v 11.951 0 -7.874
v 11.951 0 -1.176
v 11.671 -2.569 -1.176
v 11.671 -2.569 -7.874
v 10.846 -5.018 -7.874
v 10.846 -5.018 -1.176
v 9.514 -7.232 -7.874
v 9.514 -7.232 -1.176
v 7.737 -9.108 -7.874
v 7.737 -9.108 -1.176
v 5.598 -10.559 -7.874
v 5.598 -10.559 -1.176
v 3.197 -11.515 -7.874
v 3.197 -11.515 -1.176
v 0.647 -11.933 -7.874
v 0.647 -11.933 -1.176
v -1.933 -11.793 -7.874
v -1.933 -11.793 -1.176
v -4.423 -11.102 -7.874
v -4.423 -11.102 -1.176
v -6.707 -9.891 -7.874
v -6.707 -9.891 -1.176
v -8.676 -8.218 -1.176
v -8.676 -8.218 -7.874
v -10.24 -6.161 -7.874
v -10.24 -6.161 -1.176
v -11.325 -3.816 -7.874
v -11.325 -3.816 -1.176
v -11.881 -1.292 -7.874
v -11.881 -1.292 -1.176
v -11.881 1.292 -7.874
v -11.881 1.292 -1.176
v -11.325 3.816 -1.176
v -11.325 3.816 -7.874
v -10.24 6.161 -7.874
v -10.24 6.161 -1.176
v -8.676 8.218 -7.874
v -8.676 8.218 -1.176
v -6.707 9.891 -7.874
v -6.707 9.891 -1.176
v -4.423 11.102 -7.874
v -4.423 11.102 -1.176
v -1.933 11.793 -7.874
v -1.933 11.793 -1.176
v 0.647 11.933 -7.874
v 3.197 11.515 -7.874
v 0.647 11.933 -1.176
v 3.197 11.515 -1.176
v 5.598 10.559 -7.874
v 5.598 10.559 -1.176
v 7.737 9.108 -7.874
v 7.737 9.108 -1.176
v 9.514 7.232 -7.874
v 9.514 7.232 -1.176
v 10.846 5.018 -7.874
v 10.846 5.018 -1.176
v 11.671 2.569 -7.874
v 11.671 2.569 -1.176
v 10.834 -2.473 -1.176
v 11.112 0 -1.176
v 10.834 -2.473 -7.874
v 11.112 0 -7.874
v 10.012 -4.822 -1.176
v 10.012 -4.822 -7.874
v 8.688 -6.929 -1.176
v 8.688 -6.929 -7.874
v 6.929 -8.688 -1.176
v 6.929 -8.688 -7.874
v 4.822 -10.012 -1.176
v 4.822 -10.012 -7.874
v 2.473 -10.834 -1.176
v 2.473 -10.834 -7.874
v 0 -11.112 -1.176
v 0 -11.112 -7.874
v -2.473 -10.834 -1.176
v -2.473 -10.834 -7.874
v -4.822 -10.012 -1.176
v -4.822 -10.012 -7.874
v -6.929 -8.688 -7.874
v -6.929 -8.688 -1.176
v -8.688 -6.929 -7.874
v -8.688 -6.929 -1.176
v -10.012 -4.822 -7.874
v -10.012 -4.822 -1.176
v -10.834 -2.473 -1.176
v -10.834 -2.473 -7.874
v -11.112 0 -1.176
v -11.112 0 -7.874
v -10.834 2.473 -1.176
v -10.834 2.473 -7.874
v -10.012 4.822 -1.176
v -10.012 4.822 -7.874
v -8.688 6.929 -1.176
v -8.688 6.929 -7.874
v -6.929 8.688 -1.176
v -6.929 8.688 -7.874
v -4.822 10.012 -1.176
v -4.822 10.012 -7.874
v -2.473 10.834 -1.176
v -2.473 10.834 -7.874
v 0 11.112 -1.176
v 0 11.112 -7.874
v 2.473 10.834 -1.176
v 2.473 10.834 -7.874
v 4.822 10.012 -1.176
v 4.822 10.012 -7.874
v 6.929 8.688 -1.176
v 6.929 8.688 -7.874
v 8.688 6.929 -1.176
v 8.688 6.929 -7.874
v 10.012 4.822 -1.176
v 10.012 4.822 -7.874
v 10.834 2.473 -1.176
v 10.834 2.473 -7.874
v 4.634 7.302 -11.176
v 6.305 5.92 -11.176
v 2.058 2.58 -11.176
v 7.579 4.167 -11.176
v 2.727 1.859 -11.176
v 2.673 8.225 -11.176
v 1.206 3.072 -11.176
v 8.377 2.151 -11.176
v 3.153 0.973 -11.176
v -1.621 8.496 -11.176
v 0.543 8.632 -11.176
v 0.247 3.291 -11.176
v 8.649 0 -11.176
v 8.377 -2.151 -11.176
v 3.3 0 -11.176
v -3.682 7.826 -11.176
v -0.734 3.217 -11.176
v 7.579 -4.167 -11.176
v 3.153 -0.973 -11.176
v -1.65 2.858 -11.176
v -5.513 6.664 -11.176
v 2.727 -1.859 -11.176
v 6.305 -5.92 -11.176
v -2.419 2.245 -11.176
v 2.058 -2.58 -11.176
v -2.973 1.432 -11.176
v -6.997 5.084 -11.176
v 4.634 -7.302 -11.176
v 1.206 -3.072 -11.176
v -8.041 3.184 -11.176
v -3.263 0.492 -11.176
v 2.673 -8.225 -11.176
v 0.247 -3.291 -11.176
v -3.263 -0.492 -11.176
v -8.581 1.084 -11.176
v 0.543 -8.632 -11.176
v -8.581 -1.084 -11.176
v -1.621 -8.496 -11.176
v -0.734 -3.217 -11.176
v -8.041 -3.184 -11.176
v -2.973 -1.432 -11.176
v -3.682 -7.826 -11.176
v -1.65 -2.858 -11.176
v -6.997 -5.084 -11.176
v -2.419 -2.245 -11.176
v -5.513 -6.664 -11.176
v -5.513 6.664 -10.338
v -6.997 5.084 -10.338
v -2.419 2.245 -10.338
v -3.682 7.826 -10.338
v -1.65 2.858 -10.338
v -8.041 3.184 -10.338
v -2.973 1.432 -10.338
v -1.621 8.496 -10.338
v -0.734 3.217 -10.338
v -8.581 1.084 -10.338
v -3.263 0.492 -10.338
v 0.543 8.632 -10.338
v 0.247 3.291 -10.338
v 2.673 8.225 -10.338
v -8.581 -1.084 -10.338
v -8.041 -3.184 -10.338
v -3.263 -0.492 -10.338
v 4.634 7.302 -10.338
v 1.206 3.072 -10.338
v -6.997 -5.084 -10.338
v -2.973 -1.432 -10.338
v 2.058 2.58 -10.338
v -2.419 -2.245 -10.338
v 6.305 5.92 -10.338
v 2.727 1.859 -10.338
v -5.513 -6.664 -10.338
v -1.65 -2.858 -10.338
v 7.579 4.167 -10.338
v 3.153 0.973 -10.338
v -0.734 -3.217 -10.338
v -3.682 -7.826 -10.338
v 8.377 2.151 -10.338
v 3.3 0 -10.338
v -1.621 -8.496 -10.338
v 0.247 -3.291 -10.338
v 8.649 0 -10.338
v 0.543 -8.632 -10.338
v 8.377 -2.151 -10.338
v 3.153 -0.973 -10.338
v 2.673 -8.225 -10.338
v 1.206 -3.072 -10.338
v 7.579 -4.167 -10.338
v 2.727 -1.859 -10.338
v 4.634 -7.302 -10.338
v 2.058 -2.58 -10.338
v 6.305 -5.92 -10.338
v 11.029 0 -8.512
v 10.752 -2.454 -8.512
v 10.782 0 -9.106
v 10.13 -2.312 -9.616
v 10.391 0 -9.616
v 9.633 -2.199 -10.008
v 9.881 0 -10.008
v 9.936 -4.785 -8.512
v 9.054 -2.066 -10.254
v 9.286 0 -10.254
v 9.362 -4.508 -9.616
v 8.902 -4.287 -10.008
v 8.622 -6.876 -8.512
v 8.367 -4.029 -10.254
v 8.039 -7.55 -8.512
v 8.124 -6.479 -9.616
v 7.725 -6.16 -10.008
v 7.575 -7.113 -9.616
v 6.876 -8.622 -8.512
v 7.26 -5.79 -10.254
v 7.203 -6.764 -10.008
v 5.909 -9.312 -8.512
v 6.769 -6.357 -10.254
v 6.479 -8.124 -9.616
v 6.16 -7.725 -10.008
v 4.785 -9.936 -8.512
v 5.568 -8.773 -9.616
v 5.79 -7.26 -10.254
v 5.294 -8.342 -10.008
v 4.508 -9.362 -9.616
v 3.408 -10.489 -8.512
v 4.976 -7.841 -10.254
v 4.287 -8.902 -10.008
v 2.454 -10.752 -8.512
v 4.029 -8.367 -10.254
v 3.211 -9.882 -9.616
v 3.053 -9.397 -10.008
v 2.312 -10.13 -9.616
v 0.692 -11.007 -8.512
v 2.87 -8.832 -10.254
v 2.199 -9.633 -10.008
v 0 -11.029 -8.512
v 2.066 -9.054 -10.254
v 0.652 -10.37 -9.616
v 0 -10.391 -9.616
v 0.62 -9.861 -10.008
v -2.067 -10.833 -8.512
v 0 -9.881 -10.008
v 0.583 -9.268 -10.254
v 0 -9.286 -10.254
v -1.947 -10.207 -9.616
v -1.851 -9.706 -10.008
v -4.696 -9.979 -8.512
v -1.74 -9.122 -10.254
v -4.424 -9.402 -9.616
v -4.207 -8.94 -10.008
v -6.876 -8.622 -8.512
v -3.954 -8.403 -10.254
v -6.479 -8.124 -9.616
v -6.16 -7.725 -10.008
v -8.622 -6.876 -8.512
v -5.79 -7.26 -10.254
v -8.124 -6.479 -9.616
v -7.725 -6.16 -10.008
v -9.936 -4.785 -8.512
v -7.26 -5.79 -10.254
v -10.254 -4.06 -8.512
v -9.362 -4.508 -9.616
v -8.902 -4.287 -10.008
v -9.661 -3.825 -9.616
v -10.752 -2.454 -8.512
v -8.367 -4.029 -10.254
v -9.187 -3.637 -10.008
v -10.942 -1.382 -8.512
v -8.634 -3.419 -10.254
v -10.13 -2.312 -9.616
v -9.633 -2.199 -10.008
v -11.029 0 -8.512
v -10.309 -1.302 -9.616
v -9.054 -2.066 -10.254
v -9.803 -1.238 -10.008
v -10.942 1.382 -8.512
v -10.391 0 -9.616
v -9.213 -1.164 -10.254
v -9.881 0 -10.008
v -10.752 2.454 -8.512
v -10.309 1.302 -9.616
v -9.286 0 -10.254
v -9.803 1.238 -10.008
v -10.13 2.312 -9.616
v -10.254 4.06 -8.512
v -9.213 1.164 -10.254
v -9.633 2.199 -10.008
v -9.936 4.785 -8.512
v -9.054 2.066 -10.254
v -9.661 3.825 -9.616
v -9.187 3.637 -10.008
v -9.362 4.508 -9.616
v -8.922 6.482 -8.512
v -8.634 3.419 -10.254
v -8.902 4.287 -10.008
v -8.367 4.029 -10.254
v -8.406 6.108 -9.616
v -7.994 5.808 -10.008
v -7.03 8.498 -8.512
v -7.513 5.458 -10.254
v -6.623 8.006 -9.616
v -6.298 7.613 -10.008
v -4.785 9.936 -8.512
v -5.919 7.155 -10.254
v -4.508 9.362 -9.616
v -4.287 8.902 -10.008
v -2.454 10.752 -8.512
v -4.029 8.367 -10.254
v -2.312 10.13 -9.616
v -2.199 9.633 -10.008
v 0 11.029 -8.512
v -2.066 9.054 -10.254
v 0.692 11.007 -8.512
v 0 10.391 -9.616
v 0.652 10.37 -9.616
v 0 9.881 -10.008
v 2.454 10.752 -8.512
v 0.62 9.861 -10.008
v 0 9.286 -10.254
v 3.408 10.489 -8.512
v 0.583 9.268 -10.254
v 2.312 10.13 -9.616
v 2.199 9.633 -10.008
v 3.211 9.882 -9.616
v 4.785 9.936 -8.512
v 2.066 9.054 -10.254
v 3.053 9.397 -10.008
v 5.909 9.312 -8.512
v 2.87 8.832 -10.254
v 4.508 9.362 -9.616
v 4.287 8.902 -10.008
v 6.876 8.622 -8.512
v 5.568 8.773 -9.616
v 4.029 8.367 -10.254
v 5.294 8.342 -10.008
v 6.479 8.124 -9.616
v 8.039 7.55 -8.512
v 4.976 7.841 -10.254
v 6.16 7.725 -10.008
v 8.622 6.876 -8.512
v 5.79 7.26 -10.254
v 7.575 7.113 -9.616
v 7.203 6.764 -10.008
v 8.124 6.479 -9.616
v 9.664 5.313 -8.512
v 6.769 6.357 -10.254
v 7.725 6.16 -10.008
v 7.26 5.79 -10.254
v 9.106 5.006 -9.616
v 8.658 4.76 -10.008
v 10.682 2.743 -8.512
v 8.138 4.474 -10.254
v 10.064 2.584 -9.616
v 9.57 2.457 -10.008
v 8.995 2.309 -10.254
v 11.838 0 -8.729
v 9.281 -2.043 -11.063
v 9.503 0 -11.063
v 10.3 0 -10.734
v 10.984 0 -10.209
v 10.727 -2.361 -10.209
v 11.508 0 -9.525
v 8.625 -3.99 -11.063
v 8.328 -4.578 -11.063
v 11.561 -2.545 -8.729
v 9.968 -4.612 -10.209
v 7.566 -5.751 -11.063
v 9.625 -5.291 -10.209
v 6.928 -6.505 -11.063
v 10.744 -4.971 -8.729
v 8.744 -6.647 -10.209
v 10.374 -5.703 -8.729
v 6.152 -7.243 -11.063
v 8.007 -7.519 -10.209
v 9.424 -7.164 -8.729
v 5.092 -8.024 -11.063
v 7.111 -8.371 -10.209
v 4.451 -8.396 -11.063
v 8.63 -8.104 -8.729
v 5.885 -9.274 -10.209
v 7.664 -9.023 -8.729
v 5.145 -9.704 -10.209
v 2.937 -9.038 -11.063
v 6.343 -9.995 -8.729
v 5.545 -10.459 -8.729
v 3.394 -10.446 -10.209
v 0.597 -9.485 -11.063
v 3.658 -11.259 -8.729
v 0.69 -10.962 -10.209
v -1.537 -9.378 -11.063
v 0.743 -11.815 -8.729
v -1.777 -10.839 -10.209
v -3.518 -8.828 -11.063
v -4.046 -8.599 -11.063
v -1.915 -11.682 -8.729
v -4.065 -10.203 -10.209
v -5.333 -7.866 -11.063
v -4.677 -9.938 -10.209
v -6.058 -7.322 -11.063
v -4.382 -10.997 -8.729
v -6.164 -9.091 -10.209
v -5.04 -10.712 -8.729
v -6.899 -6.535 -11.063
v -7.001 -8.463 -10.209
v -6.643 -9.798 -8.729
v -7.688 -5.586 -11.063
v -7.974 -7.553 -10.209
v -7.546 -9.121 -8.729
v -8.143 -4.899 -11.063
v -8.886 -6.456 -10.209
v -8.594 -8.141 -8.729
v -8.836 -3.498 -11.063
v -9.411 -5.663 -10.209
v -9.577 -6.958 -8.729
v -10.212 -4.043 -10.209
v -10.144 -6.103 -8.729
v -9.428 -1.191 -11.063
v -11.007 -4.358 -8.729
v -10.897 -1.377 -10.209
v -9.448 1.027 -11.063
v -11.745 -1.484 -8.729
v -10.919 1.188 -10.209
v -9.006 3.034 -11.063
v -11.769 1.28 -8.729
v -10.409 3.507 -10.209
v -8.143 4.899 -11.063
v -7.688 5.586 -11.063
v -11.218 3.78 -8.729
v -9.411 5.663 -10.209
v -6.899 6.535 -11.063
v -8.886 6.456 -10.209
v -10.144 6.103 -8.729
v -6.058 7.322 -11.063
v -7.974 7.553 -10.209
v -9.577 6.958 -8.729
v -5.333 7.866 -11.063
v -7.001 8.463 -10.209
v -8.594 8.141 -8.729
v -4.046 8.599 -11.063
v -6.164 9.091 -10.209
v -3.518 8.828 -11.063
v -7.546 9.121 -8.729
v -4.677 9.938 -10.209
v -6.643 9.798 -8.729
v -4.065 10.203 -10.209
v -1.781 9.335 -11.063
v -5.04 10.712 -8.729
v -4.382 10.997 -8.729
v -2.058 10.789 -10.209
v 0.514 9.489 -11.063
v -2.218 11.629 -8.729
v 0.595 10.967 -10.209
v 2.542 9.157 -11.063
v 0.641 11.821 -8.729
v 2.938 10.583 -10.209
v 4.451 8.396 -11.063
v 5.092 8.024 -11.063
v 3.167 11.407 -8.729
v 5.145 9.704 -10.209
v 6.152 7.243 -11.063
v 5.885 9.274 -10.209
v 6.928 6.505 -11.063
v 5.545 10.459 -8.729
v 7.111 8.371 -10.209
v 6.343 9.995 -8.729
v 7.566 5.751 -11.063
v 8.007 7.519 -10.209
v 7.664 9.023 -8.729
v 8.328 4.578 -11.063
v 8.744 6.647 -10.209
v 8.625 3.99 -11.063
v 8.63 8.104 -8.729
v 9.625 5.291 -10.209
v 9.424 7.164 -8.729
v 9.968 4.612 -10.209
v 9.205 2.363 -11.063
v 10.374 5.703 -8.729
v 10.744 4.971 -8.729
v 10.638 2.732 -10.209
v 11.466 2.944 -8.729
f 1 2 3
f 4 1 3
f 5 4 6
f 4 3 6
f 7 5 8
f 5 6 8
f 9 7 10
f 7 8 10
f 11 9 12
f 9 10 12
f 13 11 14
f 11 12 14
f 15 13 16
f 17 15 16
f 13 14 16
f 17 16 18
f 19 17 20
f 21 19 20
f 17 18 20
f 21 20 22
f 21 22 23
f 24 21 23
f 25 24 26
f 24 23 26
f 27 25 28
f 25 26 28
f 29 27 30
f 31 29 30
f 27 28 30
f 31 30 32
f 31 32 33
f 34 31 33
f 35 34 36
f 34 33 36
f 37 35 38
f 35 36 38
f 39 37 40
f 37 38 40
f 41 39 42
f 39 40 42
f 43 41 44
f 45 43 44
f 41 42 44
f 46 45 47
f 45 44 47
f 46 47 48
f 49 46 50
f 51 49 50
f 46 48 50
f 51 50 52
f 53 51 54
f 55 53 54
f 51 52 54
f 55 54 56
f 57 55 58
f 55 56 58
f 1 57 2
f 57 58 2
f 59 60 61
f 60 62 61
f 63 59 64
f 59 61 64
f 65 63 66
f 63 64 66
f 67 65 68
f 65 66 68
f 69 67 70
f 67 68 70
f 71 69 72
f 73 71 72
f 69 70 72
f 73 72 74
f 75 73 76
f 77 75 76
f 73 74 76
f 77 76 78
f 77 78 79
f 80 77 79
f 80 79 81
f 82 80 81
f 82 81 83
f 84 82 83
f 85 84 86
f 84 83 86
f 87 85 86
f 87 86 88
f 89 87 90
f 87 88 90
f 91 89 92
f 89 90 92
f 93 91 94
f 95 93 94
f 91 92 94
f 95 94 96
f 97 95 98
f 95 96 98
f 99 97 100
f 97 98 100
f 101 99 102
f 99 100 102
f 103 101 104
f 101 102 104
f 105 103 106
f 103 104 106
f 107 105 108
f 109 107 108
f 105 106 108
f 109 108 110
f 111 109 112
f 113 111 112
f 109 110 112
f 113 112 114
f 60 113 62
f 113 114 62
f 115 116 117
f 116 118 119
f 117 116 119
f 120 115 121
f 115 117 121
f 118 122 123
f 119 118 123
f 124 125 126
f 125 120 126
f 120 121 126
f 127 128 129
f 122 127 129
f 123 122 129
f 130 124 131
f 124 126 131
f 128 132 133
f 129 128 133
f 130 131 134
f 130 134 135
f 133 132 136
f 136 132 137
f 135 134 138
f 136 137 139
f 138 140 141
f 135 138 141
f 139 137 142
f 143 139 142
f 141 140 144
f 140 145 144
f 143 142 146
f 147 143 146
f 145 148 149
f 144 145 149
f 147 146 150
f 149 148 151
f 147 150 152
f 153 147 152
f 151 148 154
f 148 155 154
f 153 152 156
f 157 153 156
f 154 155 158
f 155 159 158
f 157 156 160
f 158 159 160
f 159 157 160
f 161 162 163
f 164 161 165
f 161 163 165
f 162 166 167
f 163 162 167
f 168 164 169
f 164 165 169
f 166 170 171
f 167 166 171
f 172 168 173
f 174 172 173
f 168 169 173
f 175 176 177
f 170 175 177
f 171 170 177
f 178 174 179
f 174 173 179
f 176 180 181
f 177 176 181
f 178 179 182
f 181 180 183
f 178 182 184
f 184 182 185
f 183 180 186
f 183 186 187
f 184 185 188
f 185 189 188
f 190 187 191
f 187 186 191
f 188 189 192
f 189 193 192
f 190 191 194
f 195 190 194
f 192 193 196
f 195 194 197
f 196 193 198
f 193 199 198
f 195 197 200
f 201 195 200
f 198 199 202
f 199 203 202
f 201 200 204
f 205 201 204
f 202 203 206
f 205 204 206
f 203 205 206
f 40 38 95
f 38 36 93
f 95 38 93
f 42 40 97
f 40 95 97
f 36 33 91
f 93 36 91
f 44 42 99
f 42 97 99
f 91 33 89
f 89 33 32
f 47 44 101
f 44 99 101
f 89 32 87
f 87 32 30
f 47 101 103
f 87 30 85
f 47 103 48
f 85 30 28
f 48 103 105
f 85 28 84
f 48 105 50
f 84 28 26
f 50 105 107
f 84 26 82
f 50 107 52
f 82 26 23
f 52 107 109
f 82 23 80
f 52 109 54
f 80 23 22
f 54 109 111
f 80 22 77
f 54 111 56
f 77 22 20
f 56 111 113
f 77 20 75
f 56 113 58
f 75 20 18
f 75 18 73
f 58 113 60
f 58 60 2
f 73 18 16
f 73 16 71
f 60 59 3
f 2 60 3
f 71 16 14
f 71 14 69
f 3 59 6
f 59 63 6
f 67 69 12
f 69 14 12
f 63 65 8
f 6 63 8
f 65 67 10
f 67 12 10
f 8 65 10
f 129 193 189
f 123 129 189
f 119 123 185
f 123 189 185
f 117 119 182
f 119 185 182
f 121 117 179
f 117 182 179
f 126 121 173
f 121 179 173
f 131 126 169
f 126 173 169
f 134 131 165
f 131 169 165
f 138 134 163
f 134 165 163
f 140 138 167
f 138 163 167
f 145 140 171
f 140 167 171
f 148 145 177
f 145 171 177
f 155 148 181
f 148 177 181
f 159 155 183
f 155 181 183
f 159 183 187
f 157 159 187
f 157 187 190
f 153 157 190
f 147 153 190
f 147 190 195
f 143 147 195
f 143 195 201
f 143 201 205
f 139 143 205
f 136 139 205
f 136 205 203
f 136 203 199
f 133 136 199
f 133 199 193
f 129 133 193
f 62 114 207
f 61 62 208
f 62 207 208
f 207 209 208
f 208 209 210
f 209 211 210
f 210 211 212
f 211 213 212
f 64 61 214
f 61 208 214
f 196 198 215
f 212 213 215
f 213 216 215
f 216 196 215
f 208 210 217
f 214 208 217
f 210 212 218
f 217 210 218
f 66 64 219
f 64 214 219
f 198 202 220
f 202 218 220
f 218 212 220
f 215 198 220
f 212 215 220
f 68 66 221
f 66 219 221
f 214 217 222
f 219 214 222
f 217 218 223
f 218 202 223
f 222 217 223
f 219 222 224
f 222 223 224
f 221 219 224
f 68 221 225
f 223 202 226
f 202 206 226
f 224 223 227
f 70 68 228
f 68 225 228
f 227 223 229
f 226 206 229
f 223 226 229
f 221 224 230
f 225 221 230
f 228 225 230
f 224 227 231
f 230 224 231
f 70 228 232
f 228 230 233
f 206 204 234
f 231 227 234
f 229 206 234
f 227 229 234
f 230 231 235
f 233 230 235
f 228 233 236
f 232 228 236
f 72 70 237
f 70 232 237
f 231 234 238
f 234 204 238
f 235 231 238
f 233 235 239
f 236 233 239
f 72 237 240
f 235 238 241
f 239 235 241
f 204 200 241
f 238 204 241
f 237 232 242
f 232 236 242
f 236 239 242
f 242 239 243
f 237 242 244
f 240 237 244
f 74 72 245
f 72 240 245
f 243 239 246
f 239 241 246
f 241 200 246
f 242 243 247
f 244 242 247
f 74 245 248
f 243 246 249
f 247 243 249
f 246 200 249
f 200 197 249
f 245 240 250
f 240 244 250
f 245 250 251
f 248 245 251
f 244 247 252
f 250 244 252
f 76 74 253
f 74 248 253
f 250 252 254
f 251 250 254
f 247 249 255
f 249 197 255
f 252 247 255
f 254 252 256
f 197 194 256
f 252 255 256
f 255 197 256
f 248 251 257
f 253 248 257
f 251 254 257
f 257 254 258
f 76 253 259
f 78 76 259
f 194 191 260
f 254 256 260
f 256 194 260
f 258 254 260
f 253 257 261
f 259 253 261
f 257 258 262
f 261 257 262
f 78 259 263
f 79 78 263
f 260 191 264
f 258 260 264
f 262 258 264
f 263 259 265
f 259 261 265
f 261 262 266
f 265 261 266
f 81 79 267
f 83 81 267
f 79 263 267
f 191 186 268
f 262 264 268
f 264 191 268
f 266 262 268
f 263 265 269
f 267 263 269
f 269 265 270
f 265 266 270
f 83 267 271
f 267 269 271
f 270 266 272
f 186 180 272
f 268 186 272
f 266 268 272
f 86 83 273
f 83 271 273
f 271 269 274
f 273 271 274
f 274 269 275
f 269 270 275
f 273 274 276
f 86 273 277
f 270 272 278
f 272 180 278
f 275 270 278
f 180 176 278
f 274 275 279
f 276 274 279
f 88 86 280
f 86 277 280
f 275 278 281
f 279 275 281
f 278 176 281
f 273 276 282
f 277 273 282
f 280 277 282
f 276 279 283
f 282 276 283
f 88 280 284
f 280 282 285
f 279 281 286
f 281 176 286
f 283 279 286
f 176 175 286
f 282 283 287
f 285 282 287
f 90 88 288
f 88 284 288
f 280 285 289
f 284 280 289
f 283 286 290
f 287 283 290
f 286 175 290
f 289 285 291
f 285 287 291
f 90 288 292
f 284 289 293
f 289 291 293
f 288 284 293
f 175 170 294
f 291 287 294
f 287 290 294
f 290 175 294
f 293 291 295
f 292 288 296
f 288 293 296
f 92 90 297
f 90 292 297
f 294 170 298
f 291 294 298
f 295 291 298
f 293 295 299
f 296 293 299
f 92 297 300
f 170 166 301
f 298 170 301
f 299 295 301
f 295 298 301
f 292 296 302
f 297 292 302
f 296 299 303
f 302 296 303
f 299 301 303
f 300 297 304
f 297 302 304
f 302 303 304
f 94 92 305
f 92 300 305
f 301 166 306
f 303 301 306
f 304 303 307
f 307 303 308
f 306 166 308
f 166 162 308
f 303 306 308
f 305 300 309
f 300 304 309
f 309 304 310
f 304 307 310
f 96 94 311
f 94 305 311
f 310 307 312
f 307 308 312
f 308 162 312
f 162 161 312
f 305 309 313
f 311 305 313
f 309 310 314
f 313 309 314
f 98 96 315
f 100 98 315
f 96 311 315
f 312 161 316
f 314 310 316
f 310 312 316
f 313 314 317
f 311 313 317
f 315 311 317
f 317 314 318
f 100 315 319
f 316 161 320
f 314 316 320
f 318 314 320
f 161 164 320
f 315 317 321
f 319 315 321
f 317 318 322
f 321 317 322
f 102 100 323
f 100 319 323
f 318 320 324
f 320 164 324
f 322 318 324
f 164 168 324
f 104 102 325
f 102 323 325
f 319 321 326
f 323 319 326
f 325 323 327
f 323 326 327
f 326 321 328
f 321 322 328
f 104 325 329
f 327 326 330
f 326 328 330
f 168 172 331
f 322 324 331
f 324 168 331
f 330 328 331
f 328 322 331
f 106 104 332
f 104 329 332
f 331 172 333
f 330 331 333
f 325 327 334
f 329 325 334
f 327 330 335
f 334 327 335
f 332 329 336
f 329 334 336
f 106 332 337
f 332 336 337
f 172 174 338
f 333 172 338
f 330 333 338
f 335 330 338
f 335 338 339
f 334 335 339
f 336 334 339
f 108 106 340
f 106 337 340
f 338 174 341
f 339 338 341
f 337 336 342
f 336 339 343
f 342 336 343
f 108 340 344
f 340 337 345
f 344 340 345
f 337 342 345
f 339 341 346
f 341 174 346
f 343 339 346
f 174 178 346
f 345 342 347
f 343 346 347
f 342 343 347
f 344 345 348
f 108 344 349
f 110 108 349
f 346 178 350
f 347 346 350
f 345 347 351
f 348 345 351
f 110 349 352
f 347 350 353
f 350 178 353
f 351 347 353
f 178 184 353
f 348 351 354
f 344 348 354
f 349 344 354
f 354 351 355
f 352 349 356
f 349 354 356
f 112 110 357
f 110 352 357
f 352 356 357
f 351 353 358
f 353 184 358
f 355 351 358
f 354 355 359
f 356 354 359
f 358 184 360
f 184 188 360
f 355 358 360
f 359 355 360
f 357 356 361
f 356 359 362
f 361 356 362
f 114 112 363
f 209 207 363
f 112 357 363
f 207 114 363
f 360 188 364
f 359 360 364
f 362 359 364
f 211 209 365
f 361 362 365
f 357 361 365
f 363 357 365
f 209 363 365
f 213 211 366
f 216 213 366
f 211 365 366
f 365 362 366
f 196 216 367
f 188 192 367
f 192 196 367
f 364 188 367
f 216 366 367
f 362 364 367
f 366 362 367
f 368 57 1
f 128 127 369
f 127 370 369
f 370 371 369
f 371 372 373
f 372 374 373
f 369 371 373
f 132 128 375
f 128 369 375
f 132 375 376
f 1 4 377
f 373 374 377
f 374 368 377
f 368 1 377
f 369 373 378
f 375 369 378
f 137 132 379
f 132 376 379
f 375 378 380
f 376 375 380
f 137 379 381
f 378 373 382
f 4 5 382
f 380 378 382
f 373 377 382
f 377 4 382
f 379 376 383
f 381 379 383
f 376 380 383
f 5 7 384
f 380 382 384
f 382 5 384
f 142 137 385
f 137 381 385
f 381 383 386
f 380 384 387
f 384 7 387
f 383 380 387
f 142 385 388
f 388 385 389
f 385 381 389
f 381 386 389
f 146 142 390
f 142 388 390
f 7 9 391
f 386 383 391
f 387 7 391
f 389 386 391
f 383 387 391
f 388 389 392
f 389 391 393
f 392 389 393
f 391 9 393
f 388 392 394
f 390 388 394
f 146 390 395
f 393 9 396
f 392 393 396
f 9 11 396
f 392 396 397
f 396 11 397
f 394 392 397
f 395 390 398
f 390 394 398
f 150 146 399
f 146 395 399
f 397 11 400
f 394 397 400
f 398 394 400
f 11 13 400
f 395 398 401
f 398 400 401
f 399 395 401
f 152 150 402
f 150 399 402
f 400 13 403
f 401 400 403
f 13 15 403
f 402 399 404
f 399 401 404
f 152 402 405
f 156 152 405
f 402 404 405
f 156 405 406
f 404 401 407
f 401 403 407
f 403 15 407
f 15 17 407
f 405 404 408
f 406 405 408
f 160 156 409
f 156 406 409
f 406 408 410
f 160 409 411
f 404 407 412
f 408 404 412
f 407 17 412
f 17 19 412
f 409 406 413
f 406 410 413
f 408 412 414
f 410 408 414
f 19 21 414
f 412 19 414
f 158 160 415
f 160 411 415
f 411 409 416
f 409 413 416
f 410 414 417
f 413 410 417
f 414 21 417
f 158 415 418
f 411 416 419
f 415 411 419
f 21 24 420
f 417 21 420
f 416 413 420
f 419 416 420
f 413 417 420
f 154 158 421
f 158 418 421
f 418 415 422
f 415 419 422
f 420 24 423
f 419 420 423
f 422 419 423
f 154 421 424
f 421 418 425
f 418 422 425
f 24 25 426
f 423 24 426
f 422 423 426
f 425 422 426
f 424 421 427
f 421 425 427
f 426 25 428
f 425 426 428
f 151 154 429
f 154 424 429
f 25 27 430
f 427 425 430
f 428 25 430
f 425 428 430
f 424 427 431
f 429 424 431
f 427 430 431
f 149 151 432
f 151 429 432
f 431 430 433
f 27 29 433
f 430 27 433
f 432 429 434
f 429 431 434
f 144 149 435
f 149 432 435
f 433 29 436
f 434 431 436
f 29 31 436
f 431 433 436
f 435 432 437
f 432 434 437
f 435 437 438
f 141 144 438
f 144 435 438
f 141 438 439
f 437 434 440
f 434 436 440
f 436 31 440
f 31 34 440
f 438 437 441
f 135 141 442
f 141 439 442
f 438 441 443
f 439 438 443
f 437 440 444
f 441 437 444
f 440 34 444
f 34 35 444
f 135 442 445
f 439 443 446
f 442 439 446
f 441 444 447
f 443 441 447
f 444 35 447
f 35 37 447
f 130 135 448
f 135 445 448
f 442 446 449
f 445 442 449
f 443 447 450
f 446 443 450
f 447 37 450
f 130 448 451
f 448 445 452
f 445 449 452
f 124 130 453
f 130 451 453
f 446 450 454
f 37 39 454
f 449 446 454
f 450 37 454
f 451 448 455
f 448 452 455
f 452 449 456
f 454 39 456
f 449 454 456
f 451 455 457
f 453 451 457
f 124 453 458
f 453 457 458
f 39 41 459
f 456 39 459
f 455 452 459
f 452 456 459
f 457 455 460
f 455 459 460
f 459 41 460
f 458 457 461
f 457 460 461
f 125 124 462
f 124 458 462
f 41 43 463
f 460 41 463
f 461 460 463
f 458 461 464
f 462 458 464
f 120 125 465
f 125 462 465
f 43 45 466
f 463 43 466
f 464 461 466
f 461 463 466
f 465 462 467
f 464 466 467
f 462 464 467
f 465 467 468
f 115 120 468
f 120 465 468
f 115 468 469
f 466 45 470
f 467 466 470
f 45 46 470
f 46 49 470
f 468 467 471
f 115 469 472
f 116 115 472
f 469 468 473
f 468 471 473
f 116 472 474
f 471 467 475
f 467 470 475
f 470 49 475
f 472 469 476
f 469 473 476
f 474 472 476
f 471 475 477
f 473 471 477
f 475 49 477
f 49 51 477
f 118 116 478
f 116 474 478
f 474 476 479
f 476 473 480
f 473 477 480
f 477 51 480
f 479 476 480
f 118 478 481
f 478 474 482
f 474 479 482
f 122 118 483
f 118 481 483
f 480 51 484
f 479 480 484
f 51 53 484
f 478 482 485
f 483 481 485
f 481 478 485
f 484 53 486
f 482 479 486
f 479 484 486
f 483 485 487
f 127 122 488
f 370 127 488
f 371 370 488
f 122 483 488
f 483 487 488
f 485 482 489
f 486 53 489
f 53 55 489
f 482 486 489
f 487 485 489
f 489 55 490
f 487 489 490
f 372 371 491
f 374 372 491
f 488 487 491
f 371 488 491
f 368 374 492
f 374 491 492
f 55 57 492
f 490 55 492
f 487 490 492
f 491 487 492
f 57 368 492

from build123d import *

# Parameters (mm, degrees)
CUT_EXTRUDE1_DEPTH      = 21.261822212
CUT_EXTRUDE1_DEPTH_BACK = 21.261822212
SKETCH2_W               = 23.9014
SKETCH2_H               = 12.352
SKETCH3_R               = 3.3
CUT_EXTRUDE2_DEPTH      = 20.224386664


with BuildPart() as part:
    # Sketch1 → Revolve1 (revolve)
    with BuildSketch(Plane(origin=(0, 0, 0), x_dir=(0, 0, -1), z_dir=(1, 0, 0)), mode=Mode.PRIVATE) as revolve1_sk:
        with BuildLine():
            Line((-11.176, 11.9507), (-11.176, 11.1125))
            Line((-11.176, 11.1125), (7.874, 11.1125))
            ThreePointArc((7.874, 11.1125), (9.616169687, 10.390869687), (10.3378, 8.6487))
            Line((10.3378, 8.6487), (10.3378, 0))
            Line((10.3378, 0), (11.176, 0))
            Line((11.176, 0), (11.176, 8.6487))
            ThreePointArc((11.176, 8.6487), (10.208866591, 10.983566591), (7.874, 11.9507))
            Line((7.874, 11.9507), (-11.176, 11.9507))
        make_face()
    revolve(revolve1_sk.sketch.rotate(Axis((0, 0, 11.176), (0, 0, -1)), 90), axis=Axis((0, 0, 11.176), (0, 0, -1)))

    # Sketch2 → Cut-Extrude1 (cut, two sides: drawn at the far end of the back side and taken through both)
    with BuildSketch(Plane(origin=(0, 0, 0), x_dir=(1, 0, 0), z_dir=(0, 1, 0)).offset(-CUT_EXTRUDE1_DEPTH_BACK)):
        with Locations((0, -5)):
            Rectangle(SKETCH2_W, SKETCH2_H)
    extrude(amount=CUT_EXTRUDE1_DEPTH + CUT_EXTRUDE1_DEPTH_BACK, mode=Mode.SUBTRACT)

    # Sketch3 → Cut-Extrude2 (cut, through all)
    with BuildSketch(Plane.XY.offset(-10.3378)):
        Circle(SKETCH3_R)
    extrude(amount=-CUT_EXTRUDE2_DEPTH, mode=Mode.SUBTRACT)


solid = part.part
